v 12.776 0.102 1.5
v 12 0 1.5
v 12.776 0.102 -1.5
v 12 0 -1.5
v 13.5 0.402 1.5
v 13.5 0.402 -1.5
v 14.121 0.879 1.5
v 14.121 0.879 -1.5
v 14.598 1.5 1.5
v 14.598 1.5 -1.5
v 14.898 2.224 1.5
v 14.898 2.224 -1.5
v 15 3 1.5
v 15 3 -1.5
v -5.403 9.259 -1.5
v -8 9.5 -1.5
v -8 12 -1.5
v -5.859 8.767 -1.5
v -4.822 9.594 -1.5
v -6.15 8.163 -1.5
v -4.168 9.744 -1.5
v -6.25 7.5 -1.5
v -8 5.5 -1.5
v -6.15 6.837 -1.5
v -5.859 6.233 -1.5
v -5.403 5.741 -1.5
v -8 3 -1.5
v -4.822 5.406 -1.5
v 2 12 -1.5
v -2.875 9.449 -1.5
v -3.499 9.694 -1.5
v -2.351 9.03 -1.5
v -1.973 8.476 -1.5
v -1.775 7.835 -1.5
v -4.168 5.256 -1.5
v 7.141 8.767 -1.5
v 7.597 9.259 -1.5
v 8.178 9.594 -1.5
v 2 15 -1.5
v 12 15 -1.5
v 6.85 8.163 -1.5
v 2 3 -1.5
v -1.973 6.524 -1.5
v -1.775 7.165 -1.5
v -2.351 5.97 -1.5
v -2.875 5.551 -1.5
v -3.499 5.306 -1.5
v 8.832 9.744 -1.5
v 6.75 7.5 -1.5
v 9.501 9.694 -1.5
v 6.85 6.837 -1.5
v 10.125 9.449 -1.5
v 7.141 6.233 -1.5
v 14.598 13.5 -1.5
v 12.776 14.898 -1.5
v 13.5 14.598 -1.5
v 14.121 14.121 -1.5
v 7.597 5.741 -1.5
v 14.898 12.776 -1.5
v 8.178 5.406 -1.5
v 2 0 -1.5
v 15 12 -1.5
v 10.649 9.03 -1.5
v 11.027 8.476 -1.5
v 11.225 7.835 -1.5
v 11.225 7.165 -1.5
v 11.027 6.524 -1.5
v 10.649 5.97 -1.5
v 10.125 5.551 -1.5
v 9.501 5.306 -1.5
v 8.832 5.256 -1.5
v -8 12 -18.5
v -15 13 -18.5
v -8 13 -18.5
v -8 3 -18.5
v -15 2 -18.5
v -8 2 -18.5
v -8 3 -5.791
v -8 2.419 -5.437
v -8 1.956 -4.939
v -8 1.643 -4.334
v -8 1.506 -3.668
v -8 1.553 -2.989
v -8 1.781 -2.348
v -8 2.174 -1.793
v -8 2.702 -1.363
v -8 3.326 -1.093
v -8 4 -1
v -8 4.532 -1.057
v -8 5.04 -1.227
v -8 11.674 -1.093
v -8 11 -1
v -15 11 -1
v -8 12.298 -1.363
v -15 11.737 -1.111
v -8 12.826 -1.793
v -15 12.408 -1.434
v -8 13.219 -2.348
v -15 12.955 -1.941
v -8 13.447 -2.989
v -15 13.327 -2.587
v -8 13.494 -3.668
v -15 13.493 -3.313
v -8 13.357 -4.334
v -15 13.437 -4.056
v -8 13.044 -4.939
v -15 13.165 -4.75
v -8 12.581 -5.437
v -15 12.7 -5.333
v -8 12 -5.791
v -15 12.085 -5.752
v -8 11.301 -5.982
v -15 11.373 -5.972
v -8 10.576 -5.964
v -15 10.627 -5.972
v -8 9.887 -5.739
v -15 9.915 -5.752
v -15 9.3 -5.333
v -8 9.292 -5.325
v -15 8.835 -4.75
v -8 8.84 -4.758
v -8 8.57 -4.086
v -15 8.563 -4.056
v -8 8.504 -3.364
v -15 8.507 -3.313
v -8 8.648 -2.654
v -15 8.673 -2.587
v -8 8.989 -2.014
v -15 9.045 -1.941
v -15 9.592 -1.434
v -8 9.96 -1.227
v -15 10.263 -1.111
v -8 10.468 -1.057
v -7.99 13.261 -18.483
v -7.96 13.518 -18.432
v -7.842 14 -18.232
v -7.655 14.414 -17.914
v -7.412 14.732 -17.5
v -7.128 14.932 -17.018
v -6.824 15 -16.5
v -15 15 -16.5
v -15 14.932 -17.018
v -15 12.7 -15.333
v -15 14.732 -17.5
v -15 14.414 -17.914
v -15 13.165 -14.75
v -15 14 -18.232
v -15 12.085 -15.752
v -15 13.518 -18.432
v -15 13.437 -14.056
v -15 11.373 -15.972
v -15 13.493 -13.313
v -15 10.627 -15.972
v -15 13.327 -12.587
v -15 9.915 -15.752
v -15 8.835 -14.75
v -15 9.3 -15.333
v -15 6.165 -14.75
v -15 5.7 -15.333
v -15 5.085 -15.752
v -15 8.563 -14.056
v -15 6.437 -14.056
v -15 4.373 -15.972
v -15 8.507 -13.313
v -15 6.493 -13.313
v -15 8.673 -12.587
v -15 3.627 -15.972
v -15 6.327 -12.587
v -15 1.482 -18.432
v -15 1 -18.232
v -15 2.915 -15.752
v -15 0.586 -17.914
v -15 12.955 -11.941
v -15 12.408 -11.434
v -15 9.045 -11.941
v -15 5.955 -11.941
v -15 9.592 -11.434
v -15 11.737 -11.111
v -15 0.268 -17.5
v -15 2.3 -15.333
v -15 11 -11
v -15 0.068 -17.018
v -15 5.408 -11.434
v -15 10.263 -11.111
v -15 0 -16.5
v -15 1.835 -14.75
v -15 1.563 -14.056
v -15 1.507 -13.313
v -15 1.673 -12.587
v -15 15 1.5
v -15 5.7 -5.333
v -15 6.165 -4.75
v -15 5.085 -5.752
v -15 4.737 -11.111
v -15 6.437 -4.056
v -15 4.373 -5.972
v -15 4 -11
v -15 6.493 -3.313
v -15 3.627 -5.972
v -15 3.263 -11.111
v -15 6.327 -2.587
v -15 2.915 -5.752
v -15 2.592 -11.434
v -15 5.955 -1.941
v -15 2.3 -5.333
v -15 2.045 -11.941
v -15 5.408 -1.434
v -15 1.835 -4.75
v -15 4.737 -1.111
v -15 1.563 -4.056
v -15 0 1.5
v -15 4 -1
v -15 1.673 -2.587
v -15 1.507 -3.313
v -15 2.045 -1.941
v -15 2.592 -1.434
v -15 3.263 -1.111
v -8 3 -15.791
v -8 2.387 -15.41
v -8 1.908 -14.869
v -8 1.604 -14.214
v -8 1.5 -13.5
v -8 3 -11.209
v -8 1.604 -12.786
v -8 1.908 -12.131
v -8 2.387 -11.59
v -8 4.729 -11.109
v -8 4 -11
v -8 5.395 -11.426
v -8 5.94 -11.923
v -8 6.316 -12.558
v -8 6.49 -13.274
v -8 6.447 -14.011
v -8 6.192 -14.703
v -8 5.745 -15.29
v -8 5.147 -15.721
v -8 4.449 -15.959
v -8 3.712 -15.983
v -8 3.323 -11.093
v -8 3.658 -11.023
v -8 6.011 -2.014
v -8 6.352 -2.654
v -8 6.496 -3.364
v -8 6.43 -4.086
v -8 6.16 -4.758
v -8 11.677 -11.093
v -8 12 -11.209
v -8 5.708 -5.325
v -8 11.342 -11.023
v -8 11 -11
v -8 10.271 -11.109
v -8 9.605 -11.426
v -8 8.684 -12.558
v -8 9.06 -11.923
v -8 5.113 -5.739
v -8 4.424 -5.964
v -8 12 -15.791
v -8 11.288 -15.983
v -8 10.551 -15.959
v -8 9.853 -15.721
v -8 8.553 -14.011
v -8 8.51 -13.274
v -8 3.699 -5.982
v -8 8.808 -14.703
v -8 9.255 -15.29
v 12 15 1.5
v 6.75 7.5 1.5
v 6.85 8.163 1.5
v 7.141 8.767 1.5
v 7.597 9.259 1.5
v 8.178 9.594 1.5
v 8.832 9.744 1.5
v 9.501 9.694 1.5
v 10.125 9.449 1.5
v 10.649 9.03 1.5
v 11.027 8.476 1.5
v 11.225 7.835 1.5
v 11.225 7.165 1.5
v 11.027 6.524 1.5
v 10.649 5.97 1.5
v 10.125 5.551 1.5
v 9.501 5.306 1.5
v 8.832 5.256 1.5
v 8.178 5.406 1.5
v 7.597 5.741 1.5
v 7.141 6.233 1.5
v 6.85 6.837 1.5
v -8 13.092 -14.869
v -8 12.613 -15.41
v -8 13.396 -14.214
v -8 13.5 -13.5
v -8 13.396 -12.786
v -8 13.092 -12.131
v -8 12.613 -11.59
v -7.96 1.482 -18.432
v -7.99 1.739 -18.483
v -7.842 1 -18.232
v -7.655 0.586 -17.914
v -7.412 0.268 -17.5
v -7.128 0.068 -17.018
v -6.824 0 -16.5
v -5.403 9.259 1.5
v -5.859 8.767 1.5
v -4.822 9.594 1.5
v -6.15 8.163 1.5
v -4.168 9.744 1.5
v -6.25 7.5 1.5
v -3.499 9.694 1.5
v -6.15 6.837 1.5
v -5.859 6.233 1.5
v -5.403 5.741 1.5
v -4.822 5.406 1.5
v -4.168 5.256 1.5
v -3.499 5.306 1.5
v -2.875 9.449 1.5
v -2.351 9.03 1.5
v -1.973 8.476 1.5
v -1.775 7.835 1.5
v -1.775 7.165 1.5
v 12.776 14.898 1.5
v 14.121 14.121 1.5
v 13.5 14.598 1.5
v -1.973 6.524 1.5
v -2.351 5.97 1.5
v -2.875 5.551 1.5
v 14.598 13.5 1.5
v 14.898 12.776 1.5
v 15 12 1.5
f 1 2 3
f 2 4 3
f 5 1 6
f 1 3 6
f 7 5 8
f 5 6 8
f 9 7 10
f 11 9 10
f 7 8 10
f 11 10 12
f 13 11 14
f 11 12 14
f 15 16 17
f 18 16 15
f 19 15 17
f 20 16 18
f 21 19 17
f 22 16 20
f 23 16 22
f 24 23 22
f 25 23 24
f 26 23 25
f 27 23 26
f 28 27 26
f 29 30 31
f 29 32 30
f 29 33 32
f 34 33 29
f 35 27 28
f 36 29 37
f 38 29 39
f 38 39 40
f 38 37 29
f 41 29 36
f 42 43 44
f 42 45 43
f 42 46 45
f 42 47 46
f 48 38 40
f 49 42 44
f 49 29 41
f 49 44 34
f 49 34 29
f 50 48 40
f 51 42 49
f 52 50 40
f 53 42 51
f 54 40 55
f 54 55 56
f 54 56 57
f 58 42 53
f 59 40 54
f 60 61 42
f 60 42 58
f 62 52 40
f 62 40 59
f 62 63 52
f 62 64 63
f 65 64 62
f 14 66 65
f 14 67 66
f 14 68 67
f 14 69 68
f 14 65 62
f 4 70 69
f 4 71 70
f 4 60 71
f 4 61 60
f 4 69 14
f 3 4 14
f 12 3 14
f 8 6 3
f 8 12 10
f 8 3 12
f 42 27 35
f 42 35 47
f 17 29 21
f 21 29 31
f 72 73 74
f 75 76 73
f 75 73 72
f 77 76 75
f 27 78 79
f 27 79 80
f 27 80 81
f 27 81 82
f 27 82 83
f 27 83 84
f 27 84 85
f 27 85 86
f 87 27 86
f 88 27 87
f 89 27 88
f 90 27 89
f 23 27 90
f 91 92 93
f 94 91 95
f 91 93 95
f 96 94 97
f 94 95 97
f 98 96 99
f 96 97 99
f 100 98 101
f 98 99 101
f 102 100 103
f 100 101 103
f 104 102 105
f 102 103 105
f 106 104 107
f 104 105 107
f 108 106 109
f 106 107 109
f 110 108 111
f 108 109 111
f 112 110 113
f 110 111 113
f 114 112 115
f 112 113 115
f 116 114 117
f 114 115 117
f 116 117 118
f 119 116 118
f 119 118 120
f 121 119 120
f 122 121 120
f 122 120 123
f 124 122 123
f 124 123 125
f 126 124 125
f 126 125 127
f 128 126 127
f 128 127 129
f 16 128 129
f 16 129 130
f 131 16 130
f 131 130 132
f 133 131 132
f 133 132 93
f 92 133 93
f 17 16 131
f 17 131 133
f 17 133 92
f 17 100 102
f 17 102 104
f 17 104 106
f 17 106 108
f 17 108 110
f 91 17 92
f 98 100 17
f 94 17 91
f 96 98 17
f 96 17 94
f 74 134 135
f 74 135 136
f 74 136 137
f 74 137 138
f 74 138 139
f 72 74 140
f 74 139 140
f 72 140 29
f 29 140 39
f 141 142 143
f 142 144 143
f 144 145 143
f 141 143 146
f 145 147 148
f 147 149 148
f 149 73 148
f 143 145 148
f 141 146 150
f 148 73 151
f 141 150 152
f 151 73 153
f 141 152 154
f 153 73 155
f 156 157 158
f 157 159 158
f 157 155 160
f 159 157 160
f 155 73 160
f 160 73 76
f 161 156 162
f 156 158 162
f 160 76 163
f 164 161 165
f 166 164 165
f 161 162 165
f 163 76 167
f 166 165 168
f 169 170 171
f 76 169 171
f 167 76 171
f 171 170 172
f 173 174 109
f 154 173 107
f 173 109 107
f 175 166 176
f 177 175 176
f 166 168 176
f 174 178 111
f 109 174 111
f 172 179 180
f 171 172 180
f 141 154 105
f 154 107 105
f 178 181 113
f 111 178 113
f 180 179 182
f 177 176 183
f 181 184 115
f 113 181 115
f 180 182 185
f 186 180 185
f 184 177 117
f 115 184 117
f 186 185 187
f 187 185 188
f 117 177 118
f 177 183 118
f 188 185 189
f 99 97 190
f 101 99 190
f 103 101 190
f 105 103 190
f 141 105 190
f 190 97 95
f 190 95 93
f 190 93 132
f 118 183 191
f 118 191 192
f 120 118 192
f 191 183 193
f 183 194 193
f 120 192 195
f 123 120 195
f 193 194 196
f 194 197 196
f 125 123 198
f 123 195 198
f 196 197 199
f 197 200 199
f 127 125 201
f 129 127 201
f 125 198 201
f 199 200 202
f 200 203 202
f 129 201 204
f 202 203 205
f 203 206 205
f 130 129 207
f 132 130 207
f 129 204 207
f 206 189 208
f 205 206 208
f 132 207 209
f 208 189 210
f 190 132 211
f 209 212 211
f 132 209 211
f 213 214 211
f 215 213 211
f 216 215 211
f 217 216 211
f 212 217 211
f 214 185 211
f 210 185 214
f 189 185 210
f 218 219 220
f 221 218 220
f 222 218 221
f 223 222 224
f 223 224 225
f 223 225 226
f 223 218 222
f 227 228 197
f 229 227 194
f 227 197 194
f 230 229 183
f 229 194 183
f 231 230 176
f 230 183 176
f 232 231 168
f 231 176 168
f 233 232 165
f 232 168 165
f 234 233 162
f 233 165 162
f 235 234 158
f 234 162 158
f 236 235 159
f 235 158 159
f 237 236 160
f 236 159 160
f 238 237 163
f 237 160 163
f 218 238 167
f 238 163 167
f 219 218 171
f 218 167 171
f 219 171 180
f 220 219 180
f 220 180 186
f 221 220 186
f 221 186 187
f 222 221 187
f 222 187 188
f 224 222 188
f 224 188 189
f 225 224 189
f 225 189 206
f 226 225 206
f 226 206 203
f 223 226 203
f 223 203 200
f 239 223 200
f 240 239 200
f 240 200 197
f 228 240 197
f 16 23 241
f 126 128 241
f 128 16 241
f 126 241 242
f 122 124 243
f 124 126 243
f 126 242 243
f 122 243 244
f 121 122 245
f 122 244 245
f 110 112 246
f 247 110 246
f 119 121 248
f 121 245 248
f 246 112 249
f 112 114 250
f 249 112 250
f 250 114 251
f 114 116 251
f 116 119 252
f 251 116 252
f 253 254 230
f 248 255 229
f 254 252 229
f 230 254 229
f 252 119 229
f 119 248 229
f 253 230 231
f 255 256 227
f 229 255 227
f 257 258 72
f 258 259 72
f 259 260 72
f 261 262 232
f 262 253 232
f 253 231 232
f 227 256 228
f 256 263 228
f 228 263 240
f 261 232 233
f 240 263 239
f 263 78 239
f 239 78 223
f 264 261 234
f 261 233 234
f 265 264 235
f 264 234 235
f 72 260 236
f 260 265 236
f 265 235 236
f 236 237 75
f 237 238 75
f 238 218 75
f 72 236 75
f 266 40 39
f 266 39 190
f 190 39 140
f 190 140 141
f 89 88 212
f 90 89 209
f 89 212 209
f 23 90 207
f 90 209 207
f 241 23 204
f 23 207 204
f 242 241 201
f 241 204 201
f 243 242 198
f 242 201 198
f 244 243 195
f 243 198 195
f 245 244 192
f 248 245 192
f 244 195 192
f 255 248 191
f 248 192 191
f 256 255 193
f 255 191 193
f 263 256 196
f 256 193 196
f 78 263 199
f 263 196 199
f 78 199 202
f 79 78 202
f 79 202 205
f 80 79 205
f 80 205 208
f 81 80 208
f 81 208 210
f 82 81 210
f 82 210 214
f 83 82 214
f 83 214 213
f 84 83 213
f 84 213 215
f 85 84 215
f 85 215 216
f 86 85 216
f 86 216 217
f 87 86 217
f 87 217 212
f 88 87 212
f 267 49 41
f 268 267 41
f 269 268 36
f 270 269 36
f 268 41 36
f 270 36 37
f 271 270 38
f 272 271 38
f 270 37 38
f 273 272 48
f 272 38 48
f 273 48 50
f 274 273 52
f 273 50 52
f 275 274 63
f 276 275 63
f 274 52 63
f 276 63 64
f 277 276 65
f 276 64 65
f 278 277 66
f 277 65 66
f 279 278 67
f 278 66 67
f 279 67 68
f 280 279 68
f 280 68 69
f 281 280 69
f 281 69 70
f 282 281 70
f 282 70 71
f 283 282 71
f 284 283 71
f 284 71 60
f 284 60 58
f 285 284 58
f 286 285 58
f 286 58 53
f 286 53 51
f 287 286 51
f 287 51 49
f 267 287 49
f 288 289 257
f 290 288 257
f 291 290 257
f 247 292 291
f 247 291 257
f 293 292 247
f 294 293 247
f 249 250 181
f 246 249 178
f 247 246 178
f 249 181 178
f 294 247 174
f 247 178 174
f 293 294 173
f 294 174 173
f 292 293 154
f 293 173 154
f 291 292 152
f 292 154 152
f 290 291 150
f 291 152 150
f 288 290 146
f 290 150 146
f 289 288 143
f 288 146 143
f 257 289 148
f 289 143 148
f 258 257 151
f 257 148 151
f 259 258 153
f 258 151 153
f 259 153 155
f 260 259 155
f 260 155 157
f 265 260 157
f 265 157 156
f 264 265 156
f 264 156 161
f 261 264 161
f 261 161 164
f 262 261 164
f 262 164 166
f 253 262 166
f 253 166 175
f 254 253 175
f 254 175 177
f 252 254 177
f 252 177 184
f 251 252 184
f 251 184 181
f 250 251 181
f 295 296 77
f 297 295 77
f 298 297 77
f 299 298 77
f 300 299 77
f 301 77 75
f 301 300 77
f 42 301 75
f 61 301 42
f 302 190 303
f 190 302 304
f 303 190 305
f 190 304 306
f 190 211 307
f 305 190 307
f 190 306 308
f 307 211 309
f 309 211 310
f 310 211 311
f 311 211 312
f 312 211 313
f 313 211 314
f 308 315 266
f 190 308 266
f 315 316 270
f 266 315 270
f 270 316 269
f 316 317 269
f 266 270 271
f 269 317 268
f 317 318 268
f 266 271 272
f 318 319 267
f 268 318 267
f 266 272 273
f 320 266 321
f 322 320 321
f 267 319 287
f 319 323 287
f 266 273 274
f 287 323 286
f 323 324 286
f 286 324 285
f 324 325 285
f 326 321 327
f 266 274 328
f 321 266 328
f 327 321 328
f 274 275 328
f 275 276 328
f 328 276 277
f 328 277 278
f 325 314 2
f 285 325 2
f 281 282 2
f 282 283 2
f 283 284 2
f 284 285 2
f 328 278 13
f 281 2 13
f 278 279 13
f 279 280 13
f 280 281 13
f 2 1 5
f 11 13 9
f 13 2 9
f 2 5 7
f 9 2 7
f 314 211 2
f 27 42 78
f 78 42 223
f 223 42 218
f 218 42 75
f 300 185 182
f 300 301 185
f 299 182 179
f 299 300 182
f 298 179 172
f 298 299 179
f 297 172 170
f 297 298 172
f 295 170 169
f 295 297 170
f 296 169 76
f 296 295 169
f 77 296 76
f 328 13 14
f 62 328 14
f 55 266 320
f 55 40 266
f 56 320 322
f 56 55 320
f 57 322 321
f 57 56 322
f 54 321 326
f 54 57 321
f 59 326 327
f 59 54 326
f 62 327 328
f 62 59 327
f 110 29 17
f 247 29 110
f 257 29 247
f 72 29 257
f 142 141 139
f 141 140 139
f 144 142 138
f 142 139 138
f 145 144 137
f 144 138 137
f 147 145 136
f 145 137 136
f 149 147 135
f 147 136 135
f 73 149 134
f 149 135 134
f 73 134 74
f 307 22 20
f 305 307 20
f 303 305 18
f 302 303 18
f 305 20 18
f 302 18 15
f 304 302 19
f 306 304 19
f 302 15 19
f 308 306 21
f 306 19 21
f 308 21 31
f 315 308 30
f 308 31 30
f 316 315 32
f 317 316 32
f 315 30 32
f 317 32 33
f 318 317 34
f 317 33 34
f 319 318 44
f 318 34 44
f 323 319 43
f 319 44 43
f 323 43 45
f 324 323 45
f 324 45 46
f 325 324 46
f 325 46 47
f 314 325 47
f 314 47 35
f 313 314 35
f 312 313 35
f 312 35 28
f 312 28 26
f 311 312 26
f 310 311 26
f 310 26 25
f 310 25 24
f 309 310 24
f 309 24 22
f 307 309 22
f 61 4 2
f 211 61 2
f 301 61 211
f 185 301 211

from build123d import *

# Parameters (mm, degrees)
SKETCH1_W           = 30
SKETCH1_H           = 3
SKETCH1_W_2         = 7
SKETCH1_H_2         = 17
BOSS_EXTRUDE1_DEPTH = 15
BOSS_EXTRUDE2_DEPTH = 3
BOSS_EXTRUDE3_START = -15
BOSS_EXTRUDE3_DEPTH = 3
SKETCH4_R           = 2.5
CUT_EXTRUDE1_DEPTH  = 7
SKETCH5_R           = 2.25
CUT_EXTRUDE2_DEPTH  = 7
FILLET3_R           = 3
FILLET4_R           = 2


with BuildPart() as part:
    # Sketch1 → Boss-Extrude1 (new body)
    with BuildSketch(Plane(origin=(0, 0, 0), x_dir=(1, 0, 0), z_dir=(0, 1, 0))):
        Rectangle(SKETCH1_W, SKETCH1_H)
        with Locations((-11.5, 10)):
            Rectangle(SKETCH1_W_2, SKETCH1_H_2)
    extrude(amount=BOSS_EXTRUDE1_DEPTH)

    # Sketch3 → Boss-Extrude2 (add)
    with BuildSketch(Plane(origin=(0, 15, 0), x_dir=(1, 0, 0), z_dir=(0, 1, 0))):
        Polygon((-8, 18.5), (2, 1.5), (-8, 1.5), align=None)
    extrude(amount=-BOSS_EXTRUDE2_DEPTH)

    # Sketch3<3> → Boss-Extrude3 (add)
    with BuildSketch(Plane(origin=(0, 15, 0), x_dir=(1, 0, 0), z_dir=(0, 1, 0)).offset(BOSS_EXTRUDE3_START)):
        Polygon((-8, 18.5), (2, 1.5), (-8, 1.5), align=None)
    extrude(amount=BOSS_EXTRUDE3_DEPTH)

    # Sketch4 → Cut-Extrude1 (cut)
    with BuildSketch(Plane.ZY.offset(15)):
        with Locations((-3.5, 11)):
            Circle(SKETCH4_R)
        with Locations((-13.5, 11)):
            Circle(SKETCH4_R)
        with Locations((-3.5, 4)):
            Circle(SKETCH4_R)
        with Locations((-13.5, 4)):
            Circle(SKETCH4_R)
    extrude(amount=-CUT_EXTRUDE1_DEPTH, mode=Mode.SUBTRACT)

    # Sketch5 → Cut-Extrude2 (cut)
    with BuildSketch(Plane(origin=(0, 0, -1.5), x_dir=(-1, 0, 0), z_dir=(0, 0, -1))):
        with Locations((-9, 7.5)):
            Circle(SKETCH5_R)
        with Locations((4, 7.5)):
            Circle(SKETCH5_R)
    extrude(amount=-CUT_EXTRUDE2_DEPTH, mode=Mode.SUBTRACT)

    # Fillet3
    fillet3_edges = [part.edges().sort_by_distance(p)[0] for p in [
        (15, 15, 0),
        (15, 0, 0),
    ]]
    fillet(fillet3_edges, radius=FILLET3_R)

    # Fillet4
    fillet4_edges = [part.edges().sort_by_distance(p)[0] for p in [
        (-11.5, 15, -18.5),
        (-11.5, 0, -18.5),
    ]]
    fillet(fillet4_edges, radius=FILLET4_R)


solid = part.part
